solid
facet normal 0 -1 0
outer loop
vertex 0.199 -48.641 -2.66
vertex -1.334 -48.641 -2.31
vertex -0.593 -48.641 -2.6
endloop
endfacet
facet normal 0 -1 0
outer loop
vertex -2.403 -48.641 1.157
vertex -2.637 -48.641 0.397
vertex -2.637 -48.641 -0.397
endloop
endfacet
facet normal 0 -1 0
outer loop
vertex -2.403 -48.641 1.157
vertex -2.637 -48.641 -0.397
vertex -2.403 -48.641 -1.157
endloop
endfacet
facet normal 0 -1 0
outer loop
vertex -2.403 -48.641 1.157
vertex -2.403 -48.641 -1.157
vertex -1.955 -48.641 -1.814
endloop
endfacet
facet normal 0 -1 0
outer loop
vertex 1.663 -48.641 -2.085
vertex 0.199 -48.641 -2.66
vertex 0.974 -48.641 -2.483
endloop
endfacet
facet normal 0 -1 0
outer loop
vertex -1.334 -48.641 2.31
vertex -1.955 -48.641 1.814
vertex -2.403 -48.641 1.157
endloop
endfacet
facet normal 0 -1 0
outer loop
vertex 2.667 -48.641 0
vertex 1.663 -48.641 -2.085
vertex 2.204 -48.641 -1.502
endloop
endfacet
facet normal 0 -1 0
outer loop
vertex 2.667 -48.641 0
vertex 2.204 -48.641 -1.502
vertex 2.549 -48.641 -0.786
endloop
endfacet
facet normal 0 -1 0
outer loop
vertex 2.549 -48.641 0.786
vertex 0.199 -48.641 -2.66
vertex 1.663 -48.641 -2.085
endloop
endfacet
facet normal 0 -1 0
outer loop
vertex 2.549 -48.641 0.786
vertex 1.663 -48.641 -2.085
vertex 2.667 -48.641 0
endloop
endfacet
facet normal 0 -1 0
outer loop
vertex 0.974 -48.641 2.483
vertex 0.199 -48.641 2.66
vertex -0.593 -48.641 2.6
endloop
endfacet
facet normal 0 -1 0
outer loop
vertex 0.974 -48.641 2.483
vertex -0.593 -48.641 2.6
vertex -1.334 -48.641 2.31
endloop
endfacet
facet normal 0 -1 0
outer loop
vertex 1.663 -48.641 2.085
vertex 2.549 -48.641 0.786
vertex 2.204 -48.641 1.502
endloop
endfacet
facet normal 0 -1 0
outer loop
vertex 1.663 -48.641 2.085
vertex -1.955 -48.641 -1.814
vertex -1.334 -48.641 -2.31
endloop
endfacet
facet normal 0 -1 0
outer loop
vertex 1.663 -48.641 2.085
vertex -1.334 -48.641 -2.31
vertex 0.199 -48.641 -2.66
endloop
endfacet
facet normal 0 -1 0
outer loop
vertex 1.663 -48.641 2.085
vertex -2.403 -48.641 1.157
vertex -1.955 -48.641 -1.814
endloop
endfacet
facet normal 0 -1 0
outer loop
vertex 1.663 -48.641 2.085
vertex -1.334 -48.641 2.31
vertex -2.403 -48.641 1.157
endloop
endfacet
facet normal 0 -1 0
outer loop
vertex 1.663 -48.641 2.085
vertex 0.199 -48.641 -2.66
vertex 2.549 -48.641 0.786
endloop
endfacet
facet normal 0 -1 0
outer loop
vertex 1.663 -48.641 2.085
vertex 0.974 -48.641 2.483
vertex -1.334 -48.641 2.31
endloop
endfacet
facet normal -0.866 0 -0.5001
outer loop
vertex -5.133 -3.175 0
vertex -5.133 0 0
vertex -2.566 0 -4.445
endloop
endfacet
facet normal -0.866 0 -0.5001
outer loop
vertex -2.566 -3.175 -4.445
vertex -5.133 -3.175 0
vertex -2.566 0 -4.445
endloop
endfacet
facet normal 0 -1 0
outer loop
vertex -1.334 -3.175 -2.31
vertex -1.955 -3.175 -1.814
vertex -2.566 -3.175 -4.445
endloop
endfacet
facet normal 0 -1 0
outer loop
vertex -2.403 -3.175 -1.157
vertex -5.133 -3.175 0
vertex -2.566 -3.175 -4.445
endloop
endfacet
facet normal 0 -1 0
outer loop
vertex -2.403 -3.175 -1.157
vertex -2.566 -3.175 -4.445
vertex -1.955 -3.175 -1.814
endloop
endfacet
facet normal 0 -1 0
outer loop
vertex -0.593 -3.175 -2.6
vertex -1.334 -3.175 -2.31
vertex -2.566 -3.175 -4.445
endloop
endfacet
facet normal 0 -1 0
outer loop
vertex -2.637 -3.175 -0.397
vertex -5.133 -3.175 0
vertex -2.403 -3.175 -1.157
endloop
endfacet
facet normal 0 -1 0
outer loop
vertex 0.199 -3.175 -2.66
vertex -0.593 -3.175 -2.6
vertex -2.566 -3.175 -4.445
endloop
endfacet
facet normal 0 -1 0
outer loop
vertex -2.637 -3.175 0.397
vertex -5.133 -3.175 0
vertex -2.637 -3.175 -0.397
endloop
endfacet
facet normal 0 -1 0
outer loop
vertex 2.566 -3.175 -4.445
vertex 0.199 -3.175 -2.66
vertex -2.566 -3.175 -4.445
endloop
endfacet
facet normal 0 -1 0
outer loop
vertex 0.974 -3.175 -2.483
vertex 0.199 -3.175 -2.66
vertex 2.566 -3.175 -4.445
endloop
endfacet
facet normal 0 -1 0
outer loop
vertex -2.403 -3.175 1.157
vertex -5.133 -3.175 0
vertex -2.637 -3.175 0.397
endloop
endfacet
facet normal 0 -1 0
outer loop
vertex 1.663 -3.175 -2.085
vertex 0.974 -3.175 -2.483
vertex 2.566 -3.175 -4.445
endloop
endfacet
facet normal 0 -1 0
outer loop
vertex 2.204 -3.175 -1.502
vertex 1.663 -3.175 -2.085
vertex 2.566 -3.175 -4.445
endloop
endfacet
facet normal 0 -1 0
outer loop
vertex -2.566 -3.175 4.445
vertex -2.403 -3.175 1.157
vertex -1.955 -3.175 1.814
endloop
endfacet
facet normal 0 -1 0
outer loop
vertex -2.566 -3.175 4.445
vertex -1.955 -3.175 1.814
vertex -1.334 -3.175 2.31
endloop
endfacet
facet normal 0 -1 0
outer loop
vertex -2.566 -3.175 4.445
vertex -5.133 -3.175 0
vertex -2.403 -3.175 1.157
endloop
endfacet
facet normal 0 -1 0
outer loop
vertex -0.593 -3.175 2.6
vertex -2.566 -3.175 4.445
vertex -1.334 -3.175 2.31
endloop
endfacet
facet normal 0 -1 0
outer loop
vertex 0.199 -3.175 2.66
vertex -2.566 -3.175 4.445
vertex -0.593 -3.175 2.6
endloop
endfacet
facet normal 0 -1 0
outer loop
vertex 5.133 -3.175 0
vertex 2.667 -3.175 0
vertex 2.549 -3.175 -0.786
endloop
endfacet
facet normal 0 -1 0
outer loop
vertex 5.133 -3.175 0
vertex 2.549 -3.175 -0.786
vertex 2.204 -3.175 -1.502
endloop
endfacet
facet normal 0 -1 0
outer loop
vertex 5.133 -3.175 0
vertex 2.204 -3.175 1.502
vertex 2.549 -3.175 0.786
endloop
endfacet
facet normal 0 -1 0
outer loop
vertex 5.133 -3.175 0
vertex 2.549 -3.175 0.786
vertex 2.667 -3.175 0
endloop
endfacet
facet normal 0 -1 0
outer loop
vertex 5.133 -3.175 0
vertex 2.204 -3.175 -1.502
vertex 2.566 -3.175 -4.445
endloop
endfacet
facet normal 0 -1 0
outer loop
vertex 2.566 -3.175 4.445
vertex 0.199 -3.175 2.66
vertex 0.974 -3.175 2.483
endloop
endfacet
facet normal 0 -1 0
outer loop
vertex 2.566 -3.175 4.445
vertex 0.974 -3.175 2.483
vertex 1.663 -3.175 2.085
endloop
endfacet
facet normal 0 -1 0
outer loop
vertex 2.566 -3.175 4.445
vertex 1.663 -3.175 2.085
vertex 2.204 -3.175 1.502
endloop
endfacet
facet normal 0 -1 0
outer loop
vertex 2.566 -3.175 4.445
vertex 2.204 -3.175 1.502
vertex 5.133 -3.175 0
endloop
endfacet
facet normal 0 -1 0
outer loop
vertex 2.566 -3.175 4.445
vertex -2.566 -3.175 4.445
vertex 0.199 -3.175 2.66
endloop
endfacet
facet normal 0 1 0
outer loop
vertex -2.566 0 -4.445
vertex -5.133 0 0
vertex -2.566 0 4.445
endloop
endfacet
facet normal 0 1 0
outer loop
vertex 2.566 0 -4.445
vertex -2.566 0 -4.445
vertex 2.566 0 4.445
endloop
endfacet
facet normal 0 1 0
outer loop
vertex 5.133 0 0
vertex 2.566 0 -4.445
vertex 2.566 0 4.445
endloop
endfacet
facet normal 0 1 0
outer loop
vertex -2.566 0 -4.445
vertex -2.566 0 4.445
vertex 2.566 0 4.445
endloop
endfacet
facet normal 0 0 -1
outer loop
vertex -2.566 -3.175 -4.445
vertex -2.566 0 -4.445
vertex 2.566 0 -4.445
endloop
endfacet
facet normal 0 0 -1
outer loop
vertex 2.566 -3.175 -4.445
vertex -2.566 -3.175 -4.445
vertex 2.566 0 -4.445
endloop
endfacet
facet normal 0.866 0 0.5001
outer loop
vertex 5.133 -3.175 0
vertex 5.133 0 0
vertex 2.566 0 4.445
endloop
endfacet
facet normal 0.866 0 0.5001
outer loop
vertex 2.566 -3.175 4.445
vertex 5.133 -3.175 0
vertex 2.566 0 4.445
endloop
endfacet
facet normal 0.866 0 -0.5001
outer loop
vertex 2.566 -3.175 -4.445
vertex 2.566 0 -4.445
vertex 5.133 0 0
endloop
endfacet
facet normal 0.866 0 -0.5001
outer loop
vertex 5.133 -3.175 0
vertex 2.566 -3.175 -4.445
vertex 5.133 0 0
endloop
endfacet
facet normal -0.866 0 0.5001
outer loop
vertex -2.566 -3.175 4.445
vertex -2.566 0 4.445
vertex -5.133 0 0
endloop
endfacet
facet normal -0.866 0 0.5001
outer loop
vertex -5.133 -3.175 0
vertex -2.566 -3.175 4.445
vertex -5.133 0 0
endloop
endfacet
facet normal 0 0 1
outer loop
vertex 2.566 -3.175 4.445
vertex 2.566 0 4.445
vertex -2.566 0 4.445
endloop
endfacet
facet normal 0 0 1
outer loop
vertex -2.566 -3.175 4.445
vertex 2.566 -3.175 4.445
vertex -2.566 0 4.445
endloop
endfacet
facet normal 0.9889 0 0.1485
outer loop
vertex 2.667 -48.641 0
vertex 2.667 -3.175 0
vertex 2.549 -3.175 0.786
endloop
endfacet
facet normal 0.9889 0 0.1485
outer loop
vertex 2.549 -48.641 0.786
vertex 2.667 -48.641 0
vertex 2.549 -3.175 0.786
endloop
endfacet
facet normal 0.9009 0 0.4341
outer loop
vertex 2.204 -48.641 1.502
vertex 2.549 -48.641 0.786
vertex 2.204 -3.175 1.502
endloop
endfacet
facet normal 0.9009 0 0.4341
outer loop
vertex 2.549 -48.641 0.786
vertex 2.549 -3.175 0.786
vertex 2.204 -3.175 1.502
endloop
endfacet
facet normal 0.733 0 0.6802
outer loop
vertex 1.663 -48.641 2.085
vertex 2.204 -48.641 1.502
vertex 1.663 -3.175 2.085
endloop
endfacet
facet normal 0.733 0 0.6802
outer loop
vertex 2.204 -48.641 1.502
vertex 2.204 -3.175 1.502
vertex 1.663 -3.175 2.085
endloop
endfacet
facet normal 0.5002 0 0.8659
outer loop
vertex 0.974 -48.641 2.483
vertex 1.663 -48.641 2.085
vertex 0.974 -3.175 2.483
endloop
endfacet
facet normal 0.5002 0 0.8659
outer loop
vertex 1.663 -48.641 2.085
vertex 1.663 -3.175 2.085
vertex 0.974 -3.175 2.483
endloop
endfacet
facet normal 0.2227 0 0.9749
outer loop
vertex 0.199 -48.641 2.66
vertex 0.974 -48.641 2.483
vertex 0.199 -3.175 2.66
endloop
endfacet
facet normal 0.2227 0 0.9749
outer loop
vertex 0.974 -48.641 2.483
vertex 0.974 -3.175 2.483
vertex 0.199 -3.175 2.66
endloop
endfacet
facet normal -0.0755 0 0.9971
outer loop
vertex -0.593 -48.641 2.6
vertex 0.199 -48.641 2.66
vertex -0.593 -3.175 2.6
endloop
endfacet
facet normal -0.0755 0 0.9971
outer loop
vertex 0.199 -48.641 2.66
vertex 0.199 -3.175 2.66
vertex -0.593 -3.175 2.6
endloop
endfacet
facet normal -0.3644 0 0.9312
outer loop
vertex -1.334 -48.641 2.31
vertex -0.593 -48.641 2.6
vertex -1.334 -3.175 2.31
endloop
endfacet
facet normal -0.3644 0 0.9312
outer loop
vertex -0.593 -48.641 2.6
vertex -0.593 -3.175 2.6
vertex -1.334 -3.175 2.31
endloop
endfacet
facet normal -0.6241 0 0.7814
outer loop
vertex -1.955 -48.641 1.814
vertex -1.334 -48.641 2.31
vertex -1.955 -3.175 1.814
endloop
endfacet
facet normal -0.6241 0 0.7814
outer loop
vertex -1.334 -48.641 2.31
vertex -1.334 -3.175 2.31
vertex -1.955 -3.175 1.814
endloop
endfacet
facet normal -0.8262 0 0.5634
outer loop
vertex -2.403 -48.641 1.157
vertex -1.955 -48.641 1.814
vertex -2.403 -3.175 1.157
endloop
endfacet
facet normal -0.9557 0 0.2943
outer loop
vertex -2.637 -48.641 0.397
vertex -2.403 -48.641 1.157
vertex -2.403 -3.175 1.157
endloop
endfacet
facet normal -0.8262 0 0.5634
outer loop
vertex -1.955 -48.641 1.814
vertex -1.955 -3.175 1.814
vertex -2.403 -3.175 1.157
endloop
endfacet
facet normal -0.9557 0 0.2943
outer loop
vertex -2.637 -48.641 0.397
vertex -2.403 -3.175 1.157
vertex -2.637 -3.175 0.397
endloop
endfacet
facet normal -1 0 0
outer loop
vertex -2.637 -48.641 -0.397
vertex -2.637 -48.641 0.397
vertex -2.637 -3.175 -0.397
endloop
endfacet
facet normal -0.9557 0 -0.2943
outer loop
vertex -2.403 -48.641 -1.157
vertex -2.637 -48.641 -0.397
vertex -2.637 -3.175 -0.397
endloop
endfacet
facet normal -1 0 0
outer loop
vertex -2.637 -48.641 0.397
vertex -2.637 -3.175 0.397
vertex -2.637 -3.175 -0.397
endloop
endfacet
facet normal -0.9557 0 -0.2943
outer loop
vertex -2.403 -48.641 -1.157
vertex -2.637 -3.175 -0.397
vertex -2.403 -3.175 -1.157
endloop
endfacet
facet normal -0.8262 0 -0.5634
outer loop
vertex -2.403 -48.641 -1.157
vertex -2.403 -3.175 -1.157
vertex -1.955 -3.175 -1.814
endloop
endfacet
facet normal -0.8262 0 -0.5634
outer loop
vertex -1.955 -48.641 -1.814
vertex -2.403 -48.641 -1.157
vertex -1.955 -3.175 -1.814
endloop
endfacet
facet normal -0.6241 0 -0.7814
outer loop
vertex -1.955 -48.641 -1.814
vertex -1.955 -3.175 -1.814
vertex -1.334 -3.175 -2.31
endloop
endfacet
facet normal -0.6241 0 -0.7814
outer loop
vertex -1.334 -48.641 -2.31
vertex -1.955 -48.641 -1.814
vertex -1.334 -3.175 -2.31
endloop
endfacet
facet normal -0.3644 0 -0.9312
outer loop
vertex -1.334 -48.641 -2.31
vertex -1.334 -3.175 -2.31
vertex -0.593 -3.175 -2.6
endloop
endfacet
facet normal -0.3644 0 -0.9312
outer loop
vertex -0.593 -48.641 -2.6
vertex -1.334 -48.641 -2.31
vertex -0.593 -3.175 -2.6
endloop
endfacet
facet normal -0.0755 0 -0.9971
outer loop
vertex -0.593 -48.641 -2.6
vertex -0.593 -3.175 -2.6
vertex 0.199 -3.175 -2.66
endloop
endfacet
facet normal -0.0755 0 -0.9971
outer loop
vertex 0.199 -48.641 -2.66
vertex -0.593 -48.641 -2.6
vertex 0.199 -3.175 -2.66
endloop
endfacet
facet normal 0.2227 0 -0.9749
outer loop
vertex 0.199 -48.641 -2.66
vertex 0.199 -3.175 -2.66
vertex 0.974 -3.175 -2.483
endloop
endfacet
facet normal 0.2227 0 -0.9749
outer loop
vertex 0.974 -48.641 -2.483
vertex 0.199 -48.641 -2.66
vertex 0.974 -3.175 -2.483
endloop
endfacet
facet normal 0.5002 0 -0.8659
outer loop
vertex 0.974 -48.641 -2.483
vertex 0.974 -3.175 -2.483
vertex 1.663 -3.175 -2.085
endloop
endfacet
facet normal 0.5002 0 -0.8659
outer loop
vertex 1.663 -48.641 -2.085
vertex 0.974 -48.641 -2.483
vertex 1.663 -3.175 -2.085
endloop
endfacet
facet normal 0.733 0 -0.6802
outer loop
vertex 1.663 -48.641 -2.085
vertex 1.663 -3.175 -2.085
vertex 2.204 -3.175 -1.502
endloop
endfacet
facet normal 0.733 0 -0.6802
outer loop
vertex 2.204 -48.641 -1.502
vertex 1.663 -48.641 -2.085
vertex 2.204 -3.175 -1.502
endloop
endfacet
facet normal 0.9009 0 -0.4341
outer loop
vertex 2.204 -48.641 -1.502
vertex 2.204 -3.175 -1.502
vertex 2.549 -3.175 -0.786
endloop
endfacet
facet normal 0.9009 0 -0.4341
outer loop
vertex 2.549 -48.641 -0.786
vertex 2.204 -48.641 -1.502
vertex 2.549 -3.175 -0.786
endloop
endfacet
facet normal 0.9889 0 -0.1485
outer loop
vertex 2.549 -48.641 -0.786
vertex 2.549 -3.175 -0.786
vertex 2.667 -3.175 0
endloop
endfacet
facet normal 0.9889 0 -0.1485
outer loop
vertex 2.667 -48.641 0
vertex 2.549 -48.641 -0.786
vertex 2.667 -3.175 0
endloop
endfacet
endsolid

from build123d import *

# Parameters (mm, degrees)
F0_R     = 2.667
F1_DEPTH = 3.175
F2_DEPTH = 48.641


with BuildPart() as f1:
    # F0 (on Front) → F1 (new body)
    with BuildSketch(Plane.XZ):
        Polygon((2.566322, 4.445), (-2.566322, 4.445), (-5.132644, 0), (-2.566322, -4.445), (2.566322, -4.445), (5.132644, 0), align=None)
        Circle(F0_R, mode=Mode.SUBTRACT)
        Circle(F0_R)
    extrude(amount=F1_DEPTH)

    # F0 (on Front) → F2 (join)
    with BuildSketch(Plane.XZ):
        Circle(F0_R)
    extrude(amount=F2_DEPTH)


solid = f1.part
